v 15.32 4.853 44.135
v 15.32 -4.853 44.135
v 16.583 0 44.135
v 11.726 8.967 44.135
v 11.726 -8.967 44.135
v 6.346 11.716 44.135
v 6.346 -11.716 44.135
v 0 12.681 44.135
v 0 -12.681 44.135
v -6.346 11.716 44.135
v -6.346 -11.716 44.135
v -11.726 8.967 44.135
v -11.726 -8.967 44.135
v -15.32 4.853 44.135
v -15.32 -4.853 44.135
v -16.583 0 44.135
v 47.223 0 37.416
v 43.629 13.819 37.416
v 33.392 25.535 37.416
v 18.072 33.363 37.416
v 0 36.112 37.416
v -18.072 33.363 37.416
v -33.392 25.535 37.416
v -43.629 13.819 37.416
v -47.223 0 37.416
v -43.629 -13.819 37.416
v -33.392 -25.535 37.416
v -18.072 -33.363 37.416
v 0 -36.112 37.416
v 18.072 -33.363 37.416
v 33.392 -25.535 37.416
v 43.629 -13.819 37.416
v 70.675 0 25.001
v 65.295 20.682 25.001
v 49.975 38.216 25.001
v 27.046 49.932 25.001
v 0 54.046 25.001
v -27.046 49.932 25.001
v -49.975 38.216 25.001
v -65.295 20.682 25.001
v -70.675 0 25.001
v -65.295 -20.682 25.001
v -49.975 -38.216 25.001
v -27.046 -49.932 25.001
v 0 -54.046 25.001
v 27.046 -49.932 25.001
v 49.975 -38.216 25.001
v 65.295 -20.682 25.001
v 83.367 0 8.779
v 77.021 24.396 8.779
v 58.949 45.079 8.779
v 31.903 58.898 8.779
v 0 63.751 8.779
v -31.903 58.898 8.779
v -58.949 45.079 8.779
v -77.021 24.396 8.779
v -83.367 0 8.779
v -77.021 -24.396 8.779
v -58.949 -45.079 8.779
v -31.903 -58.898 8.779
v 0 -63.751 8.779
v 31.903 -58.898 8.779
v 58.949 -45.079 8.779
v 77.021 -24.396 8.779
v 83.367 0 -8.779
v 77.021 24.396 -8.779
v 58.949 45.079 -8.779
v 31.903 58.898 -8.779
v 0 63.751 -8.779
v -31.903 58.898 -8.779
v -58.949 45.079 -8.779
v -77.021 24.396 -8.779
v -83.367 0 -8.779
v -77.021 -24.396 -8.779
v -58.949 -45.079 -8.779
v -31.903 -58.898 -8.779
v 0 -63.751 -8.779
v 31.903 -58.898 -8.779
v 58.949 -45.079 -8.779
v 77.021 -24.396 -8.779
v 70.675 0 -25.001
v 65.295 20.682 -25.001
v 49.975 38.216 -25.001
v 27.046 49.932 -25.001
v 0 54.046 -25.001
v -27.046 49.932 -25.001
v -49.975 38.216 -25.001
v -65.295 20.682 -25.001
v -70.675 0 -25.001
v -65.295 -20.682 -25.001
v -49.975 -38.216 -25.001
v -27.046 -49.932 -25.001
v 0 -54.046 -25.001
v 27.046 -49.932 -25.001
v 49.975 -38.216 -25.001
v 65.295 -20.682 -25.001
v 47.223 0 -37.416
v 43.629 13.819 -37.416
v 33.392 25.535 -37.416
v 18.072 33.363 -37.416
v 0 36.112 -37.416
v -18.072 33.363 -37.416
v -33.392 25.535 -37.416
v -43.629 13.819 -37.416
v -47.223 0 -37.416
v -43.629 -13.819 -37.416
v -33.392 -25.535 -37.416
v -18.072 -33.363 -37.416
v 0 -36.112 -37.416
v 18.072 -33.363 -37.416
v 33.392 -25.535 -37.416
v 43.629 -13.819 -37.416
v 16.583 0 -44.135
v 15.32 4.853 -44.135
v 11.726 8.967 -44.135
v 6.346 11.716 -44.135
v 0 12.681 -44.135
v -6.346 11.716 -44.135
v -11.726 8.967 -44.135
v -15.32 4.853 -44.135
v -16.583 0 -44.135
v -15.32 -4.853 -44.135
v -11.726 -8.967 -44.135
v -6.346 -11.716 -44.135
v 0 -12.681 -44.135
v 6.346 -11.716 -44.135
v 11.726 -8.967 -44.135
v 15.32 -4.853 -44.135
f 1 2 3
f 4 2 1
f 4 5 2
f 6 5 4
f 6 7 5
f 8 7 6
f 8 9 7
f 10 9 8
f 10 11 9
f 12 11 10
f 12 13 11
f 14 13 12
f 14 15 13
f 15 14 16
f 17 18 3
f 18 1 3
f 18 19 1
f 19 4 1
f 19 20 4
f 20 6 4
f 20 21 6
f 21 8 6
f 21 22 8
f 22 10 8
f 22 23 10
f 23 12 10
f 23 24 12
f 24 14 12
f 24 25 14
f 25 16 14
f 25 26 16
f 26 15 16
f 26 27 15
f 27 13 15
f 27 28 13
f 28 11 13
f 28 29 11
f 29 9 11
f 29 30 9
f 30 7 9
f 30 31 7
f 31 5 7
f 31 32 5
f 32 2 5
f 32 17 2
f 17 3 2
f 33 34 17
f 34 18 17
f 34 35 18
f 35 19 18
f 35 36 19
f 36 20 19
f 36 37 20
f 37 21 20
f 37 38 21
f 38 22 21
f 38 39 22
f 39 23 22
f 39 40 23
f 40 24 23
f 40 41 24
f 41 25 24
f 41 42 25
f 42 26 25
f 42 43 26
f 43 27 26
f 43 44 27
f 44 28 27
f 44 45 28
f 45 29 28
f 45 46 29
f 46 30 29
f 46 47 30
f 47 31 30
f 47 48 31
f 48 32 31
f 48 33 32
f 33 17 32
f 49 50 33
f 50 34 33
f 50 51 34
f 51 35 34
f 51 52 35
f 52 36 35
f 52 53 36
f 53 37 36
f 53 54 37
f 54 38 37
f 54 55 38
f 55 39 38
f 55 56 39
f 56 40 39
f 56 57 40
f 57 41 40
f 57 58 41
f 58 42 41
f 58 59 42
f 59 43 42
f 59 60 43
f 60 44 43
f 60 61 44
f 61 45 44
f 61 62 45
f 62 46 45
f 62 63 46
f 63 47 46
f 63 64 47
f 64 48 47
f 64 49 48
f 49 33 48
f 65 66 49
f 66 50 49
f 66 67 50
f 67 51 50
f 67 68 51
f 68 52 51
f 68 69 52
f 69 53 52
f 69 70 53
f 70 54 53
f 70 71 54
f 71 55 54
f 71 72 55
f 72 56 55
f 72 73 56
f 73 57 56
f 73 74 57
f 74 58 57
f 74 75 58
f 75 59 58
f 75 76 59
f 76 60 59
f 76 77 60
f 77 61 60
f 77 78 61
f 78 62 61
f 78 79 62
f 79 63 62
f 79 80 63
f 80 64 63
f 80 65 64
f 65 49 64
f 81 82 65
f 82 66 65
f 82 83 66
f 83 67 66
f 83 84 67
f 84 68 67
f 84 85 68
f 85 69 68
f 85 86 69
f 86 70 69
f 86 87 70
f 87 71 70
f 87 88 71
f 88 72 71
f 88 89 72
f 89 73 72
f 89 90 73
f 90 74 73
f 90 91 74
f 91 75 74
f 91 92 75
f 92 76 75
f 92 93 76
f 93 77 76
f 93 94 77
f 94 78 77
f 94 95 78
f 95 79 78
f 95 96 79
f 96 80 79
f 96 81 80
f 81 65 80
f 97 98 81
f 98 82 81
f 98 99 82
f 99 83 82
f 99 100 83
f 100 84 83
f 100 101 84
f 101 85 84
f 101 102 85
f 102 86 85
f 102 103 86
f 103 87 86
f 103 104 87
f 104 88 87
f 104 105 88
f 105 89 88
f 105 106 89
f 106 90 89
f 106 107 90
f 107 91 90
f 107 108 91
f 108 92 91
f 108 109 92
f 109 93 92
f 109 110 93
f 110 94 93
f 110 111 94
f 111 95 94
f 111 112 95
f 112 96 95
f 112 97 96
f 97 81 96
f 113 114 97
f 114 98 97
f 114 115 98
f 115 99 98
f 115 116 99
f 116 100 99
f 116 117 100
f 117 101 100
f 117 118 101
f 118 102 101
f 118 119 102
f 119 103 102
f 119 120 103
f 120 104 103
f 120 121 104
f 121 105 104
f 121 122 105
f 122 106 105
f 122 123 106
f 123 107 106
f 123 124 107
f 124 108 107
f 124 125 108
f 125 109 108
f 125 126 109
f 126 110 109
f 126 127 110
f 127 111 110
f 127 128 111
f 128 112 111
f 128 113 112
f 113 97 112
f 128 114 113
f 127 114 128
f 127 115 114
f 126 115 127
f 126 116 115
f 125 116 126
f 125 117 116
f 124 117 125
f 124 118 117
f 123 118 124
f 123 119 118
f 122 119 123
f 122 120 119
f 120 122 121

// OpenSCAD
// Generated by SolidPython 1.0.1 on 2020-07-29 00:46:53


scale(v = [17, 13, 9]) {
	sphere(r = 5);
}
/***********************************************
*********      SolidPython code:      **********
************************************************
 
# import packages: SolidPython
from solid import *
from solid.utils import *
from itertools import chain, combinations, permutations


class Resize:

    def __init__(self, scad_file):
        self.scad_file = scad_file
        #self.scad_file = import_scad(scad_file)
        # cone/cylinder param:
        self.r1 = 0
        self.r2 = 0
        self.h = 0
        # rectangular prism param:
        self.w = 0
        self.l = 0
        # ellipse param:
        self.r = 0

    # import OpenScad code (file name corresponds to shape)


    # classify shape + parameters
    def assign(self, param1, param2, param3):
        if self.scad_file == 'cone.scad':
            self.r1 = param1
            self.r2 = param2
            self.h = param3
        elif self.scad_file == 'cylinder.scad':
            self.r1 = param1
            self.r2 = param2
            self.h = param3
        elif self.scad_file == 'rectangularPrism.scad':
            self.h = param1
            self.l = param2
            self.w = param3
        else:
            self.r = param1
            self.h = param2

    # resize parameters
    def iterate(self):
        x = range(3, 20, 2)
        i = 1
        if self.scad_file == 'cone.scad':
            tempList = list(permutations(x, 2))
            for temp in tempList:
                param1 = temp[0]
                param2 = temp[1]
                filepath = 'produced_scad_files/' + 'cone' + str(param1) + '_' + str(param2) + '_' + '.scad'
                scad_render_to_file(cylinder(h=param1, r1=param2, r2=0), filepath)

        elif self.scad_file == 'cylinder.scad':
            tempList = list(permutations(x, 3))
            for temp in tempList:
                param1 = temp[0]
                param2 = temp[1]
                filepath = 'produced_scad_files/' + 'cylinder' + str(param1) + '_' + str(param2) + '_' + '.scad'
                scad_render_to_file(cylinder(h=param1, r1=param2, r2=param2), filepath)

        elif self.scad_file == 'rectangularPrism.scad':
            tempList = list(permutations(x, 3))
            for temp in tempList:
                param1 = temp[0]
                param2 = temp[1]
                param3 = temp[2]
                filepath = 'produced_scad_files/' + 'rectangularPrism' + str(param1) + '_' + str(param2) + '_' + str(
                    param3) + '.scad'
                scad_render_to_file(cube(size=(param1, param2, param3)), filepath)

        elif self.scad_file == 'ellipse.scad':
            tempList = list(permutations(x, 4))
            for temp in tempList:
                param1 = temp[0]
                param2 = temp[1]
                param3 = temp[2]
                param4 = temp[3]
                filepath = 'produced_scad_files/' + 'ellipse' + str(param1) + '_' + str(param2) + '_' + str(param3) + '_' + str(param4) + '.scad'
                scad_render_to_file(scale([param1, param2, param3])(sphere(r=param4)), filepath)

    def render_to_scadfile(self):
        scad_render_to_file(scad, 'example.scad') 
 
************************************************/
